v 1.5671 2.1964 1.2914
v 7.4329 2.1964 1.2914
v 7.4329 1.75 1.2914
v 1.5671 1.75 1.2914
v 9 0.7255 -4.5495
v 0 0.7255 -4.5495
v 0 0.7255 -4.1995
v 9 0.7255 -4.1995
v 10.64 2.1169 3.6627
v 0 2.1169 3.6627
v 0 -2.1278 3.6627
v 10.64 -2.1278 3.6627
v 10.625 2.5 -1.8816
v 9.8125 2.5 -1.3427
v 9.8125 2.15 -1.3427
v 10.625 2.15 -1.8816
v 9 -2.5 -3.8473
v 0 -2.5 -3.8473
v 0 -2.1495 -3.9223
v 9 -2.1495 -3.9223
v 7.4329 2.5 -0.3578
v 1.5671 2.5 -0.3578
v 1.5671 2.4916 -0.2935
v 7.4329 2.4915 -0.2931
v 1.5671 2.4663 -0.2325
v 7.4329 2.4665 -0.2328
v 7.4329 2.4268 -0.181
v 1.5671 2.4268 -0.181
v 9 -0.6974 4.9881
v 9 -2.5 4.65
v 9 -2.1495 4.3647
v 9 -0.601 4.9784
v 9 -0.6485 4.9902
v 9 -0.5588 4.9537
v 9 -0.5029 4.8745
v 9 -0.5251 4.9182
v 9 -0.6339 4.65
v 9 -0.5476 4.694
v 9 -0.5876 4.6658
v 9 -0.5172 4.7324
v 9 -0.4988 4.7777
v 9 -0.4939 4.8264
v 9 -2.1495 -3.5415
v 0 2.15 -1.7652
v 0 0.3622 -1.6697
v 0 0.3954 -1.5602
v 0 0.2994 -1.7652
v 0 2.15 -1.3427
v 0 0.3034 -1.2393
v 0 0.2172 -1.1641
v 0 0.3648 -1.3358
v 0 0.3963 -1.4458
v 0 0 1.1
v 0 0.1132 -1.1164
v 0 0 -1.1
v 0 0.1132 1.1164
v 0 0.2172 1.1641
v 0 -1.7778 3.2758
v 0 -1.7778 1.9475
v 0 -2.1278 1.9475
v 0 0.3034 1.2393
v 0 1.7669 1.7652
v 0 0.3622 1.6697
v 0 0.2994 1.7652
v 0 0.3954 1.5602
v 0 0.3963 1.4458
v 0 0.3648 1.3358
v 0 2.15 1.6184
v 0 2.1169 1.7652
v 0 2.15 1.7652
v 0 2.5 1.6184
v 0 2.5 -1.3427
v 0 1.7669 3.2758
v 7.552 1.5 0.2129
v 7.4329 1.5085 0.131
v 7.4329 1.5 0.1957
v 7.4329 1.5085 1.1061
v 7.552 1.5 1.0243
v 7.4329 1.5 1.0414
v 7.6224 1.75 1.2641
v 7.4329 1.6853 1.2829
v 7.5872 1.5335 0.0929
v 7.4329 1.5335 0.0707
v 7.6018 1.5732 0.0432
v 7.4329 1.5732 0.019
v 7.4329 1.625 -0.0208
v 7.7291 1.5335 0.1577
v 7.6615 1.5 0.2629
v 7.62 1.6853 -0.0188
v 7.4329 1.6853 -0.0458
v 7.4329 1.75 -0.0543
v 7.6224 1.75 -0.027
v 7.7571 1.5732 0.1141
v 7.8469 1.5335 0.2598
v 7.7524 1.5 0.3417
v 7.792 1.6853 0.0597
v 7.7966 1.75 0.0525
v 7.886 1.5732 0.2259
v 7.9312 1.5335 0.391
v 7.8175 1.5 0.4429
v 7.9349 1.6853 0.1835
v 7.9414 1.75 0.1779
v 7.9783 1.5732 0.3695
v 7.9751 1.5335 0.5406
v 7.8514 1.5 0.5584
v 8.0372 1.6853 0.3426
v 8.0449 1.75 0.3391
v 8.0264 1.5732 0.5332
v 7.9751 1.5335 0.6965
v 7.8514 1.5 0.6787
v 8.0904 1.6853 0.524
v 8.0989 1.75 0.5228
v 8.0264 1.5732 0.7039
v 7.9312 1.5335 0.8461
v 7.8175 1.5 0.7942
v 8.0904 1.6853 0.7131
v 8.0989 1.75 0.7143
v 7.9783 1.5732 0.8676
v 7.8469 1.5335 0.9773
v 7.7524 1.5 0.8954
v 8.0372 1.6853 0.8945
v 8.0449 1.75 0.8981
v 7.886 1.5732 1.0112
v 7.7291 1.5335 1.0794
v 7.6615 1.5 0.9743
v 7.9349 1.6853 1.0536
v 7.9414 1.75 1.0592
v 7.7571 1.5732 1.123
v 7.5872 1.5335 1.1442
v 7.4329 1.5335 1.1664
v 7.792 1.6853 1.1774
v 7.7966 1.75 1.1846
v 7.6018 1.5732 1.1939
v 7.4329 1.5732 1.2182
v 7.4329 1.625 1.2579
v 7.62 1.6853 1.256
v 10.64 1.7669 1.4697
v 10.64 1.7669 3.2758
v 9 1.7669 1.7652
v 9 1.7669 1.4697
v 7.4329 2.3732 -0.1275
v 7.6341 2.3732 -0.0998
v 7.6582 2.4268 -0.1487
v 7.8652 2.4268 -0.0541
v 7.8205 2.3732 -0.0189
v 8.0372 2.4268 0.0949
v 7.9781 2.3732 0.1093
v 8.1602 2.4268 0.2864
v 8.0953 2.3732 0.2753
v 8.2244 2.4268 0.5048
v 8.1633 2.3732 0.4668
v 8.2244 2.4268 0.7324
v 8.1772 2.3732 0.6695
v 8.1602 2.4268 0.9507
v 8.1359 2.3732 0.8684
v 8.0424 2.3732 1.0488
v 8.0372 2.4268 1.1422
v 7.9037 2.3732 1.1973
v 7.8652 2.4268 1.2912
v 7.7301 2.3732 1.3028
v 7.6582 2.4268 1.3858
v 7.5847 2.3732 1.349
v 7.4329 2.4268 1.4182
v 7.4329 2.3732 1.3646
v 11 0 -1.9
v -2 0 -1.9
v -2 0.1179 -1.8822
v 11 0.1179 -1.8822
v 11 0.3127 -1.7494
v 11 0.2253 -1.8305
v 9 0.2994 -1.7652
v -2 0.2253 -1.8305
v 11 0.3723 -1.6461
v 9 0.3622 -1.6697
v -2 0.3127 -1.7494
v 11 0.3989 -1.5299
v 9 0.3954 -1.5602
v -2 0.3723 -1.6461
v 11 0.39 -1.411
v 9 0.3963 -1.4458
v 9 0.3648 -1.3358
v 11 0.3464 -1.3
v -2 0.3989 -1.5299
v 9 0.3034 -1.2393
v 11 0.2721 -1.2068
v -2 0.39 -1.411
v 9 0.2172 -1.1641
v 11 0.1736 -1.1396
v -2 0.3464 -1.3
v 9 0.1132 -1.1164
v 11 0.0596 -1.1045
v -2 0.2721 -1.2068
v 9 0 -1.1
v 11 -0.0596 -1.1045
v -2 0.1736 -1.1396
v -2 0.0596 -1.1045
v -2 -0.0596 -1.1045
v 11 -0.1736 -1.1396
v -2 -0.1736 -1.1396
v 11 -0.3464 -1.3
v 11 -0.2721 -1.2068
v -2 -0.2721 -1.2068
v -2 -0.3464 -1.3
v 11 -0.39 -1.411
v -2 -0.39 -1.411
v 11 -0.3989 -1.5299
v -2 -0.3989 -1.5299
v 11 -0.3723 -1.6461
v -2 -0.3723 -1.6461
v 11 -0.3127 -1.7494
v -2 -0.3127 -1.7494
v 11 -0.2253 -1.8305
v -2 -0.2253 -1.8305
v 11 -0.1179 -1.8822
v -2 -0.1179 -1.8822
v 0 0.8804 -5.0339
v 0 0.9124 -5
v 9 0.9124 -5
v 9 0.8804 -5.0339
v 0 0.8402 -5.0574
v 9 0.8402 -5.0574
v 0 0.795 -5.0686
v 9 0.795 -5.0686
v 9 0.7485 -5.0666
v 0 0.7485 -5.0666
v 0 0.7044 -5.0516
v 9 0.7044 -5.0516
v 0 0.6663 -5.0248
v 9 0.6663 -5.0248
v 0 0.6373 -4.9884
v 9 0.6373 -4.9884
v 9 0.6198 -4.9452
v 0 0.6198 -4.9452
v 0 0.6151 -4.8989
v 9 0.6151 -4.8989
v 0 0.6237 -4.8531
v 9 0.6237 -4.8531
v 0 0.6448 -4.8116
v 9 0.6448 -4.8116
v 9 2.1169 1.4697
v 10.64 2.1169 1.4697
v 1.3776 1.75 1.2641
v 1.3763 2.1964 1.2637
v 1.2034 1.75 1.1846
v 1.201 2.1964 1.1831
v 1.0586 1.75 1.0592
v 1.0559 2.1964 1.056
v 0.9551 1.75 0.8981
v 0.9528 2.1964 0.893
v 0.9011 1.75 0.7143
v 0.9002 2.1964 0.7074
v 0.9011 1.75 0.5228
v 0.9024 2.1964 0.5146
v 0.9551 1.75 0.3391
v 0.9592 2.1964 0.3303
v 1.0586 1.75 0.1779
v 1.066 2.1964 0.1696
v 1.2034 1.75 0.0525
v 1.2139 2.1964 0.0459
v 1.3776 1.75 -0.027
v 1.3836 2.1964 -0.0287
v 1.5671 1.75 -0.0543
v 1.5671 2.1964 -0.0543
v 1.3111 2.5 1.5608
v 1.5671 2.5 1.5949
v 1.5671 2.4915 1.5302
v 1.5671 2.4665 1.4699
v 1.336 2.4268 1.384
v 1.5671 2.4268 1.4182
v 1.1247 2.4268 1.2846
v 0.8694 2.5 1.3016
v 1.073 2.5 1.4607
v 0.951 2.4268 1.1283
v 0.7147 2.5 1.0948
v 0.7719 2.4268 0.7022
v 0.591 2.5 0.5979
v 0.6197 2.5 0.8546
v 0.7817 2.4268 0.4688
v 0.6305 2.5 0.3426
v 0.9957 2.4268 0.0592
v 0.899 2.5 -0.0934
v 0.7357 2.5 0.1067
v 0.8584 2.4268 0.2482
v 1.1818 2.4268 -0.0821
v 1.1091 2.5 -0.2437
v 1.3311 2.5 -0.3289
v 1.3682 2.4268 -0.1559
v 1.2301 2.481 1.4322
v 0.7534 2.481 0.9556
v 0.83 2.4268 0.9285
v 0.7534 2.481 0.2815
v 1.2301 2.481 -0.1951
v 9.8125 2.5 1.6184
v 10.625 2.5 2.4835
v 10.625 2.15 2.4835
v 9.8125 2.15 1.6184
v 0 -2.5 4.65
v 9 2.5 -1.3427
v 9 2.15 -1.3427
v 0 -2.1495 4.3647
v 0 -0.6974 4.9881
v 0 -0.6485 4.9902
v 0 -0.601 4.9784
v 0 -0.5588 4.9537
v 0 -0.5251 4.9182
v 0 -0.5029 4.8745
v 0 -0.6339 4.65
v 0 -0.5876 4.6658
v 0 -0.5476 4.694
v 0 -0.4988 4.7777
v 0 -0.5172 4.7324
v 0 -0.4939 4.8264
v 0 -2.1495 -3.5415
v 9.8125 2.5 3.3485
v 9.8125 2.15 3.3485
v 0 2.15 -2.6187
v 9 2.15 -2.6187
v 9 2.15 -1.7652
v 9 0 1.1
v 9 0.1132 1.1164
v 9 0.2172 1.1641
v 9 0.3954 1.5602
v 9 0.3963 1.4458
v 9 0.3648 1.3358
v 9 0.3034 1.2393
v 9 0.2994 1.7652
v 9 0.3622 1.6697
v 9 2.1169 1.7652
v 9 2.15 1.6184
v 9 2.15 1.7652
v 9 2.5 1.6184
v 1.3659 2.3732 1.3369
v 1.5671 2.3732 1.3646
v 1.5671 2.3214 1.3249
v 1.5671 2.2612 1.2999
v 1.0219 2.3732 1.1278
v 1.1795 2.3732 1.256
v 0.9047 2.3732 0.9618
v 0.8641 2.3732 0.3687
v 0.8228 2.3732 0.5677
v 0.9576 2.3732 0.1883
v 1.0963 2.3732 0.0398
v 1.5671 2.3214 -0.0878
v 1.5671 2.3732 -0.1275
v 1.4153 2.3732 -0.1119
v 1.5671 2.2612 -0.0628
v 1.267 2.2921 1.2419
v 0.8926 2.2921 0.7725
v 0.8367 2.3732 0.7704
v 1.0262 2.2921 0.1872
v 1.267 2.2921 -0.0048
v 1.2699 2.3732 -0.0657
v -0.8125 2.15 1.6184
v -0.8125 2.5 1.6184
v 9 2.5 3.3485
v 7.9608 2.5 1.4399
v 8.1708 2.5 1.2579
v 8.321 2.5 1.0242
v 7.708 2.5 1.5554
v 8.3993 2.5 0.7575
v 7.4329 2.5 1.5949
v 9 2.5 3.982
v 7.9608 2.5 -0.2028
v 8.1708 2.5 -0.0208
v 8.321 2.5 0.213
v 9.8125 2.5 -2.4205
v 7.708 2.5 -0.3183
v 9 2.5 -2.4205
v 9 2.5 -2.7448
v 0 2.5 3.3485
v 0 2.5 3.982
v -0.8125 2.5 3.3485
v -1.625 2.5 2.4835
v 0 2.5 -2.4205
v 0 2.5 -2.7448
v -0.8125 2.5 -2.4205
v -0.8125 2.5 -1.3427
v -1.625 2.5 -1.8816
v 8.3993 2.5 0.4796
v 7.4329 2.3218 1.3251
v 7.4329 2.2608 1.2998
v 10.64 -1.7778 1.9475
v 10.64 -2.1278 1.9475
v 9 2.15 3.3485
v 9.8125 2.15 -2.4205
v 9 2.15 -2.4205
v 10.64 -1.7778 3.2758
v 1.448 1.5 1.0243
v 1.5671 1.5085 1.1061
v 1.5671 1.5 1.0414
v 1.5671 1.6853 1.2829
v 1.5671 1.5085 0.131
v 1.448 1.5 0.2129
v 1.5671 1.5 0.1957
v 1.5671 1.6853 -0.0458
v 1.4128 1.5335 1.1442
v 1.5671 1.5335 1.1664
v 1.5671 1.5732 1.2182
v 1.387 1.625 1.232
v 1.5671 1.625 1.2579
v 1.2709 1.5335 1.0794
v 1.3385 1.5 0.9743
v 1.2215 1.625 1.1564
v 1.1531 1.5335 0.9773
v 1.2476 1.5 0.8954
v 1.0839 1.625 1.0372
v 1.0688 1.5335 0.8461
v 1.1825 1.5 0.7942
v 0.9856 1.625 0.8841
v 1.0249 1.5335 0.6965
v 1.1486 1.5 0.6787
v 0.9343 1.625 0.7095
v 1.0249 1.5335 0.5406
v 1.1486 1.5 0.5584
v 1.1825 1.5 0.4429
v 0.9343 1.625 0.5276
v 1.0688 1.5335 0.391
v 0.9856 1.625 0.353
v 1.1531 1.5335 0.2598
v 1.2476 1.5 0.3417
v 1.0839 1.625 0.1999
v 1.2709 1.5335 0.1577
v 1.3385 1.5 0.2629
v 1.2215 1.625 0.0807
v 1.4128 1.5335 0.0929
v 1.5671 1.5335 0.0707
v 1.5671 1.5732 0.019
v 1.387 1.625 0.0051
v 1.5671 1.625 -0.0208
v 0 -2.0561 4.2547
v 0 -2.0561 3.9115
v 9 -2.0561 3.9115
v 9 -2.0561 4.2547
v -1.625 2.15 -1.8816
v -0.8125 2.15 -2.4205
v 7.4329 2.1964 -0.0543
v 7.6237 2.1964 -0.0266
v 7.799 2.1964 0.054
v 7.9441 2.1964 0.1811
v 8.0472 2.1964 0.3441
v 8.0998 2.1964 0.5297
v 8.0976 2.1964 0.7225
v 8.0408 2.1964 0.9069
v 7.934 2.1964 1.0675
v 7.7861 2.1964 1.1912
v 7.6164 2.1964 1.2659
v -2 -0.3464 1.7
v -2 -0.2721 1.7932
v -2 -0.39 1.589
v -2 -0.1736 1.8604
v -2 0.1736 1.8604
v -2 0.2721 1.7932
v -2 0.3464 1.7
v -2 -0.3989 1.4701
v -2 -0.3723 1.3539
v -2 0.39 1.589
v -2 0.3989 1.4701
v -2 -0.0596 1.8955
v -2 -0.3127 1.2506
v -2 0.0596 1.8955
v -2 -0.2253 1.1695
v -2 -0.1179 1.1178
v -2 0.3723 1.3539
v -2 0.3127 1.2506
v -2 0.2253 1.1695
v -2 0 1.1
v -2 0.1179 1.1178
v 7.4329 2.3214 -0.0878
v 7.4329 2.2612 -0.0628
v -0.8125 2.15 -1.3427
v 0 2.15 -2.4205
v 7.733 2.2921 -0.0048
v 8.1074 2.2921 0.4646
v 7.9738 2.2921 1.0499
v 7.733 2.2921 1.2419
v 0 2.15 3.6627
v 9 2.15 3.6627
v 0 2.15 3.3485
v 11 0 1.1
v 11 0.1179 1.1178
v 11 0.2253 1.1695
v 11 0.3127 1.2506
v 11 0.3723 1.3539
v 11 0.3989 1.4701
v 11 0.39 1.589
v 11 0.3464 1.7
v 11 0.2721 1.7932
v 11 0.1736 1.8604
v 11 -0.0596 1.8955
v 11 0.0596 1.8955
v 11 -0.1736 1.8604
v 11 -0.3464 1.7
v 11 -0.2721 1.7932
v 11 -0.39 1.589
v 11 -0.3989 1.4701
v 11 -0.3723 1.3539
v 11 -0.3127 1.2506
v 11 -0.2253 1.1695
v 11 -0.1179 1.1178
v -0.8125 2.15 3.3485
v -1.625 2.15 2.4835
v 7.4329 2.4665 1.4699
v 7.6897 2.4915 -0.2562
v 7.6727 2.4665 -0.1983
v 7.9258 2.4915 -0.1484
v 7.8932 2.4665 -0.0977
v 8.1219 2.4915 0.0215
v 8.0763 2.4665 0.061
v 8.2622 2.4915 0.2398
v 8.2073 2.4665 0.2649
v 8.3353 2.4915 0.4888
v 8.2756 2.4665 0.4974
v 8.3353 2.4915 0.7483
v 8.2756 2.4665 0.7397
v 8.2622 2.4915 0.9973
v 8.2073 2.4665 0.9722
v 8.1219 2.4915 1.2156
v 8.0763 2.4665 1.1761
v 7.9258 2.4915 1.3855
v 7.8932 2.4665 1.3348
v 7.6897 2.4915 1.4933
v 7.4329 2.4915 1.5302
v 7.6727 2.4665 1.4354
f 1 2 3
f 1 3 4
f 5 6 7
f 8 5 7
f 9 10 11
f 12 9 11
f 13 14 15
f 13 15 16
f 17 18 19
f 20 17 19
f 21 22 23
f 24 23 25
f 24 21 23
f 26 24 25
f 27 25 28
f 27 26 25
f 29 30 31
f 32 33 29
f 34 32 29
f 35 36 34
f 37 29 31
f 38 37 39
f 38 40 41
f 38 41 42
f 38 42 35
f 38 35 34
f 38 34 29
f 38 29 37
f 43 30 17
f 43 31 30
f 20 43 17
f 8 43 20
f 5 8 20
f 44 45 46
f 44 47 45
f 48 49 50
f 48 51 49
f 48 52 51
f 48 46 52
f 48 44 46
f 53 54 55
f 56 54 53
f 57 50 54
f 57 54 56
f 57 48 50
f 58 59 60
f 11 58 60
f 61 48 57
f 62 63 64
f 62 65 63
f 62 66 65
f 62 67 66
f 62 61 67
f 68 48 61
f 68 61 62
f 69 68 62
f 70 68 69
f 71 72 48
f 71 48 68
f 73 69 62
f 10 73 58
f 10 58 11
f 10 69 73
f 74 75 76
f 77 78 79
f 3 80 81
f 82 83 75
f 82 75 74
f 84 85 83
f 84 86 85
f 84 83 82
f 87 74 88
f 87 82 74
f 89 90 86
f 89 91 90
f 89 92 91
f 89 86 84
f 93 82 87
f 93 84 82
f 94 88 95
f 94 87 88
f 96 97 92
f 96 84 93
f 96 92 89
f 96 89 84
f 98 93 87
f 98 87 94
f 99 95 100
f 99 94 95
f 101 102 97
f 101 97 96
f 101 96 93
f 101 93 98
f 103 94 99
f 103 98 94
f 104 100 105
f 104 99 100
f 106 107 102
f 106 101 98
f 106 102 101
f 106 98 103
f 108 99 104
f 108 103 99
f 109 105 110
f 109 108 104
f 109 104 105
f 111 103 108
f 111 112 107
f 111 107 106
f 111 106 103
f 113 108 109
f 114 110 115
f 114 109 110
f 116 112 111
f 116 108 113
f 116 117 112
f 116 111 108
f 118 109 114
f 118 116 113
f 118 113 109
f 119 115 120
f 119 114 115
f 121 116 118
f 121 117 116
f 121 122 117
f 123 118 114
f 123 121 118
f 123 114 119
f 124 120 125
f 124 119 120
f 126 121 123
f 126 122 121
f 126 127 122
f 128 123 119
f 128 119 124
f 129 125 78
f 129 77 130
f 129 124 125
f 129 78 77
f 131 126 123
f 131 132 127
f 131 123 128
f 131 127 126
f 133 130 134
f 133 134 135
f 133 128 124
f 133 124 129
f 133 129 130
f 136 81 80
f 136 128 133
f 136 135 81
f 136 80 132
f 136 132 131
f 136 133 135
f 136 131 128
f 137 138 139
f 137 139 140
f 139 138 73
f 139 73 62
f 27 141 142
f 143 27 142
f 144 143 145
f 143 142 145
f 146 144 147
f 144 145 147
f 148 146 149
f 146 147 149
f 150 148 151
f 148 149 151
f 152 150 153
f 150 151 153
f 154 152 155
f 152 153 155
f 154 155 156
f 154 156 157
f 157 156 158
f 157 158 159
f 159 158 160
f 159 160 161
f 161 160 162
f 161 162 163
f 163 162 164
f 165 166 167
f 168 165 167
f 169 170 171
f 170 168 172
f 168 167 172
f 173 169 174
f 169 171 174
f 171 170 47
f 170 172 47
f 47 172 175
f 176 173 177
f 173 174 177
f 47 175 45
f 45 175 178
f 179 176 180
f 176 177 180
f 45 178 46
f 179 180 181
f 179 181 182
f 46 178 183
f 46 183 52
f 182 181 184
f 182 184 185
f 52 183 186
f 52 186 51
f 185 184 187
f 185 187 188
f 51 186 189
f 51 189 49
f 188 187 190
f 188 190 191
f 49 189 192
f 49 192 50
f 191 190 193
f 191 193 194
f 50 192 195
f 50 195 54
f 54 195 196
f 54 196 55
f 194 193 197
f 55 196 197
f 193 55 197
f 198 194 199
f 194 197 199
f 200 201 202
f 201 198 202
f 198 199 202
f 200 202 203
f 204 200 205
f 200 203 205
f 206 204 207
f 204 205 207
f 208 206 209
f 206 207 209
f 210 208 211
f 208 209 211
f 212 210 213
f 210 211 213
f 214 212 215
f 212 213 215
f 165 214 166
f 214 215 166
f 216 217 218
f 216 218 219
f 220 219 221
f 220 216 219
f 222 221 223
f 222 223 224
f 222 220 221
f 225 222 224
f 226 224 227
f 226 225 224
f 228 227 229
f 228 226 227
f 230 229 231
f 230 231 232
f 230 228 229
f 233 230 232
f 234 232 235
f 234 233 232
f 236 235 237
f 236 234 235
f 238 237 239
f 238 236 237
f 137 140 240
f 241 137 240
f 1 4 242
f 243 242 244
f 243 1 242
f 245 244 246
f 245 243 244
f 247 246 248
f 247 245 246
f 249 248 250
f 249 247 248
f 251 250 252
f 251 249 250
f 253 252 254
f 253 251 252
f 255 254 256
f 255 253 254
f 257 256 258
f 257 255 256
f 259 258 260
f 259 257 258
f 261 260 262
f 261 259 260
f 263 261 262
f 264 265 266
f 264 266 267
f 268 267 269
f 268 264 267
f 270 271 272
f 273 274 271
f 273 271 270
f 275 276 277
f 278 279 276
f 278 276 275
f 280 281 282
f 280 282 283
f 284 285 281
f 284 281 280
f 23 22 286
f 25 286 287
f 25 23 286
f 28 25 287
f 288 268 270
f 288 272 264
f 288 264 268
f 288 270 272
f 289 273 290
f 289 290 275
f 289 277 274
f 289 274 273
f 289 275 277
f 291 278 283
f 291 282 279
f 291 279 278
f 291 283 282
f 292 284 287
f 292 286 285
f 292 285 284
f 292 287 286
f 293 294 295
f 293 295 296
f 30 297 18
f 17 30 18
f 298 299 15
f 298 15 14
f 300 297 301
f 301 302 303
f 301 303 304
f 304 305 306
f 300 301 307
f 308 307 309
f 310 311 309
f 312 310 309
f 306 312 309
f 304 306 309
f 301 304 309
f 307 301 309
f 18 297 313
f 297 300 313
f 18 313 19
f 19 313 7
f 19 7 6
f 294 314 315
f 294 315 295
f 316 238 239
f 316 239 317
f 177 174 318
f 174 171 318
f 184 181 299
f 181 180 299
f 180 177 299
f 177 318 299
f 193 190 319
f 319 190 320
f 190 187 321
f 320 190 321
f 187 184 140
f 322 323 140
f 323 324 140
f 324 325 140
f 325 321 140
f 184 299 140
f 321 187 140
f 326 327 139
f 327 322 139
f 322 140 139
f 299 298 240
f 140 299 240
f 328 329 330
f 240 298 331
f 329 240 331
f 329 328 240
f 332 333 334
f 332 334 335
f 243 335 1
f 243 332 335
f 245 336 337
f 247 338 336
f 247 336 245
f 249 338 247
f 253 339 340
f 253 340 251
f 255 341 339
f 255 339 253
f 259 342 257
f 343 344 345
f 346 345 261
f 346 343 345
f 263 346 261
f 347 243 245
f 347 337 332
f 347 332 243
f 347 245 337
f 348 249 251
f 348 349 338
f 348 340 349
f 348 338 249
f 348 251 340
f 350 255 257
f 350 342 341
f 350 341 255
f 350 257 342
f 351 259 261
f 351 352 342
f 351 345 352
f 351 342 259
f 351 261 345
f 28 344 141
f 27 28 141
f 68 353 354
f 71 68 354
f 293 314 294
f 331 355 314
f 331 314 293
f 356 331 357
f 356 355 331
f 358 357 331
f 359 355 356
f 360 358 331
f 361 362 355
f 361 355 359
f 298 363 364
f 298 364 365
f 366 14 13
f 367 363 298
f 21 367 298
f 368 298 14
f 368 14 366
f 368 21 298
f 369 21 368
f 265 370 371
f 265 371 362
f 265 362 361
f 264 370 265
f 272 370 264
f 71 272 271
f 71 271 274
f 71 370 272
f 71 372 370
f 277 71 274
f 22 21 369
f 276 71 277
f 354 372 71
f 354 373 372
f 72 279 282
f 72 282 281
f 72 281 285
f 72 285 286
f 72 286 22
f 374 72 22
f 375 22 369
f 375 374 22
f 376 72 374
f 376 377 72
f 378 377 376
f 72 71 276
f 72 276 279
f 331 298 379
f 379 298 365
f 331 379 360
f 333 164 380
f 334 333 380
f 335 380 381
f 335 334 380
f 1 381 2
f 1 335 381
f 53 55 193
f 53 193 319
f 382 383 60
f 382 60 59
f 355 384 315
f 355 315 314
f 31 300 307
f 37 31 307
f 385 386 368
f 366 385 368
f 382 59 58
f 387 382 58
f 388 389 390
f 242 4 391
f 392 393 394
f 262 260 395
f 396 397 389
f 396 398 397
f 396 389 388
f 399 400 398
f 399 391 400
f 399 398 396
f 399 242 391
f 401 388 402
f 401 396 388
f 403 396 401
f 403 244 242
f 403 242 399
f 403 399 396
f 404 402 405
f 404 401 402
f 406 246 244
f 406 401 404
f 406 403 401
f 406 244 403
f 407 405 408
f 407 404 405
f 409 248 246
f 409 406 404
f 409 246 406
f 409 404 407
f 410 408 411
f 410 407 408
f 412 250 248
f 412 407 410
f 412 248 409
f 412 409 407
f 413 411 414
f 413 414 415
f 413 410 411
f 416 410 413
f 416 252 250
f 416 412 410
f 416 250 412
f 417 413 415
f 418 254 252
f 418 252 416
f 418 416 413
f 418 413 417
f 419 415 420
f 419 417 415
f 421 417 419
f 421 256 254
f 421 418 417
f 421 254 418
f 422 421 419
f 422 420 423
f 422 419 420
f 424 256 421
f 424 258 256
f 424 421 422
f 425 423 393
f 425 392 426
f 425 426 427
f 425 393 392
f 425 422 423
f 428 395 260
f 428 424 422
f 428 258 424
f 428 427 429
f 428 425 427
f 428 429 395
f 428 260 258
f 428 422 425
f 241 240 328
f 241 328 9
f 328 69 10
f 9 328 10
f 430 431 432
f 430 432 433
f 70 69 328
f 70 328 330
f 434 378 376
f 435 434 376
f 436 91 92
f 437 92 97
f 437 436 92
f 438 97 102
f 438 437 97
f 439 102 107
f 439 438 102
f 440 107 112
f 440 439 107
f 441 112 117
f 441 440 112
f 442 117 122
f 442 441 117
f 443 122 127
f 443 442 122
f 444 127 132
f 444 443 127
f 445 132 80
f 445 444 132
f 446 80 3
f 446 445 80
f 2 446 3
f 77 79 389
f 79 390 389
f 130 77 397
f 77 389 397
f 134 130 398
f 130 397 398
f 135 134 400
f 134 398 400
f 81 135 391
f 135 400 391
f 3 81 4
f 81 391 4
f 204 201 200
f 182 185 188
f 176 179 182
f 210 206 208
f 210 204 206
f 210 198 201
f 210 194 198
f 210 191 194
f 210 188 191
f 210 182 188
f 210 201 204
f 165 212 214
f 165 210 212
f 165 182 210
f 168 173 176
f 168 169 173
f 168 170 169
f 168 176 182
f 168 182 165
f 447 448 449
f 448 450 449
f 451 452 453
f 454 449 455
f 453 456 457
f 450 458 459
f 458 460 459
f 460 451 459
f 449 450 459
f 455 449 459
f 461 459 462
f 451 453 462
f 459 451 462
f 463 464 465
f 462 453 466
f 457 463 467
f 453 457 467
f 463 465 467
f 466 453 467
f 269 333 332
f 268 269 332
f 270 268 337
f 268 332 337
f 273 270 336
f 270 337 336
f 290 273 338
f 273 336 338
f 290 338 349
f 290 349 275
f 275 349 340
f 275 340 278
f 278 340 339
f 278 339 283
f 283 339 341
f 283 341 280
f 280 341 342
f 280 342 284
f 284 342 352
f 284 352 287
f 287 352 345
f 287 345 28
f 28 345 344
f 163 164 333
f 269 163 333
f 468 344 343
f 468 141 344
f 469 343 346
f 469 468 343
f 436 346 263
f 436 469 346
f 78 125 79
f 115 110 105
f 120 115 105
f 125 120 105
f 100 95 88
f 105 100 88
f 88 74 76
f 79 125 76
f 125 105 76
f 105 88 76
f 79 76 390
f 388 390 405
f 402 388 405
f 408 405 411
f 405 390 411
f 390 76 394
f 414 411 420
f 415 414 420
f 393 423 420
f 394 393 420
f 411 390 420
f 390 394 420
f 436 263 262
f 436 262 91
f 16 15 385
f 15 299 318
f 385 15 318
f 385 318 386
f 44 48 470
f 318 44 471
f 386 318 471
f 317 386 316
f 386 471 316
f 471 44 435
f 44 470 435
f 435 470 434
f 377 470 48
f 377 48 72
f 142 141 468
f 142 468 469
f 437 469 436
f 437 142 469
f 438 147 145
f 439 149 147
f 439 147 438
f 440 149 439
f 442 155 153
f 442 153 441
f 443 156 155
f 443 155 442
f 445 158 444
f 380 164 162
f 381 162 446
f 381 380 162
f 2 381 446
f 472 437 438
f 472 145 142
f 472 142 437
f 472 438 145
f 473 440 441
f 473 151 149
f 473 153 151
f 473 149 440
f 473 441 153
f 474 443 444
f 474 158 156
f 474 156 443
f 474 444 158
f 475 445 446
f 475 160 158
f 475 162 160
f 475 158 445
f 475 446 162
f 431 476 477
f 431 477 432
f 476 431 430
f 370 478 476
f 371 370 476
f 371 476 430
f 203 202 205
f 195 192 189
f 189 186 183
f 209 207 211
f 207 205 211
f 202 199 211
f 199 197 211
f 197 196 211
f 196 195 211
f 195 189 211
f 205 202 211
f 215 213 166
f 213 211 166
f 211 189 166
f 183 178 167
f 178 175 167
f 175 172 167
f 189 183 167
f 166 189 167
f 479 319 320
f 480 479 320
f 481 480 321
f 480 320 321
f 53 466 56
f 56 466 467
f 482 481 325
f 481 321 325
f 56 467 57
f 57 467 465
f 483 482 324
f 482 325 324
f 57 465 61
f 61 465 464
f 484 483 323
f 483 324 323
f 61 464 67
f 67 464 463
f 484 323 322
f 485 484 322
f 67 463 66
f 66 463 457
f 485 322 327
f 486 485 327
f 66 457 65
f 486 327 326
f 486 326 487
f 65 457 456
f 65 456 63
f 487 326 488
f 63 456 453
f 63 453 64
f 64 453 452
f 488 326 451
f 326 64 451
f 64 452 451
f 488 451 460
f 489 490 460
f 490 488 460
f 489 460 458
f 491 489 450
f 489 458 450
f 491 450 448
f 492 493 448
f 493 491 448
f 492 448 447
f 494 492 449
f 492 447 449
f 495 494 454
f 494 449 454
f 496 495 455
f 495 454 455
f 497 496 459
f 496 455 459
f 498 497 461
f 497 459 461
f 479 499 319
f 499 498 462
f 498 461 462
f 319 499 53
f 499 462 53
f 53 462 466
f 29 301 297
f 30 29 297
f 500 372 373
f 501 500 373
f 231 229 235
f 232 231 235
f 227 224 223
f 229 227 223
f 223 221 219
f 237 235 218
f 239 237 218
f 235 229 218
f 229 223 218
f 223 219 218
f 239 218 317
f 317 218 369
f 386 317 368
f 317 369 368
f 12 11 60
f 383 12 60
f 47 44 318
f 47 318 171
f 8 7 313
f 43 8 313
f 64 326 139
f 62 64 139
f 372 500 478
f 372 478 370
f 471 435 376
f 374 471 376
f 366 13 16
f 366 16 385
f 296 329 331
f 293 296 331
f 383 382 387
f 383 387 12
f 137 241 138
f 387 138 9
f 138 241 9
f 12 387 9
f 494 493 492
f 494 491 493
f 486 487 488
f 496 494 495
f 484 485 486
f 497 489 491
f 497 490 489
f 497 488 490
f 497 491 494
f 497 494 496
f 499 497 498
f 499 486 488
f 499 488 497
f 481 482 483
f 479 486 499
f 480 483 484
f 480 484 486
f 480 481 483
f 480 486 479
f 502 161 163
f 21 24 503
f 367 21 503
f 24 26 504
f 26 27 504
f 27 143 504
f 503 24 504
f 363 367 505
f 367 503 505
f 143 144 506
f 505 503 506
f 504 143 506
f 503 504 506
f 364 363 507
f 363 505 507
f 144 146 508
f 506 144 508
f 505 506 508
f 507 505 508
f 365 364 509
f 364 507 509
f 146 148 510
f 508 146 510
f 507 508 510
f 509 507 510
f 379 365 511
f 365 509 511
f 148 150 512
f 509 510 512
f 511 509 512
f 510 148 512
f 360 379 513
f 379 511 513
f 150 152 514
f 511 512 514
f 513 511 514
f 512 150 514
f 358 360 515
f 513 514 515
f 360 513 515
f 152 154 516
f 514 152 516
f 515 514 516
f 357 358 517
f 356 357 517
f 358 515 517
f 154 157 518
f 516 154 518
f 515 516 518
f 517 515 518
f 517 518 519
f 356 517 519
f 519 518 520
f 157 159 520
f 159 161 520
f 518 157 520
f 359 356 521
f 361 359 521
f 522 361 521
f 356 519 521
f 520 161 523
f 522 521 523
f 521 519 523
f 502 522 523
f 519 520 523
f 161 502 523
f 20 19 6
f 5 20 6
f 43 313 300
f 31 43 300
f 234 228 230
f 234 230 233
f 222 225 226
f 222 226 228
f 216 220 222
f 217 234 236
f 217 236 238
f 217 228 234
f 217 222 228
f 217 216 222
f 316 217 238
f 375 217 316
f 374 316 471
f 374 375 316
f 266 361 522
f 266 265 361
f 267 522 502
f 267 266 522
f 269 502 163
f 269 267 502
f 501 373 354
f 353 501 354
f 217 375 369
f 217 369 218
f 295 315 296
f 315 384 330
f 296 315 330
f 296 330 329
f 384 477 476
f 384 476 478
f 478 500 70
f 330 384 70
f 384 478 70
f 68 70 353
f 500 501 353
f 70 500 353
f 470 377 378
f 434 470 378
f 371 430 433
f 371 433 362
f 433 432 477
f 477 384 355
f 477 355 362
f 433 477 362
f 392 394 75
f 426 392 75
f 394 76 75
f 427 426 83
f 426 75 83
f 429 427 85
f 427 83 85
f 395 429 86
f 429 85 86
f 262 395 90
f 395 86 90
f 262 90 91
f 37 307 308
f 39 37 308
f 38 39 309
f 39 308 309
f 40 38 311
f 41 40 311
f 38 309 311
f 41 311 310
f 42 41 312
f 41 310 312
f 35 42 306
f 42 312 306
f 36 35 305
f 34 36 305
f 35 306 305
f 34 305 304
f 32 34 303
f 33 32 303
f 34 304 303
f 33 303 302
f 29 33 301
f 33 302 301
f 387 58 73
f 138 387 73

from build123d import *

# Parameters (mm, degrees)
RESSALTO_EXTRUS_O1_DEPTH      = 9
RESSALTO_EXTRUS_O1_2_DEPTH    = 9
CORTE_EXTRUS_O1_DEPTH         = 1
CHANFRO1_SIZE                 = 0.2
FILETE1_R                     = 0.25
FILETE2_R                     = 0.25
FILETE3_R                     = 0.25
RESSALTO_EXTRUS_O2_DEPTH      = 3
RESSALTO_EXTRUS_O2_DEPTH_BACK = 12
ESBO_O3_R                     = 0.4
ESBO_O4_W                     = 1.462776185
ESBO_O4_H                     = 17.561147647
CORTE_EXTRUS_O3_DEPTH         = 12
RESSALTO_EXTRUS_O3_DEPTH      = 4
RESSALTO_EXTRUS_O3_DEPTH_BACK = 12
ESBO_O5_W                     = 1.730119391
ESBO_O5_H                     = 0.35
ESBO_O5_W_2                   = 1.077736426
CORTE_EXTRUS_O6_DEPTH         = 0.36
CORTE_EXTRUS_O8_DEPTH         = 2.36
CORTE_EXTRUS_O9_DEPTH         = 3
CORTE_EXTRUS_O10_DEPTH        = 0.36
CORTE_EXTRUS_O11_DEPTH        = 0.36


with BuildPart() as part:
    # Esboço1 → Ressalto-extrusão1 (new body)
    with BuildSketch(Plane(origin=(0, 0, 0), x_dir=(0, 0, -1), z_dir=(1, 0, 0))):
        with BuildLine():
            ThreePointArc((5, 0.912371134), (5.039602728, 0.68438786), (4.811619455, 0.644785132))
            Line((4.811619455, 0.644785132), (2.61869959, 2.15))
            Line((2.61869959, 2.15), (1.765244755, 2.15))
            Line((1.765244755, 2.15), (1.765244755, 0))
            Line((1.765244755, 0), (-1.765244755, 0))
            Line((-1.765244755, 0), (-1.765244755, 2.15))
            Line((-1.765244755, 2.15), (-3.6626751, 2.15))
            Line((-3.6626751, 2.15), (-3.911509847, -2.056109913))
            Line((-3.911509847, -2.056109913), (-4.254719223, -2.056109913))
            Line((-4.254719223, -2.056109913), (-3.981958763, 2.5))
            Line((-3.981958763, 2.5), (2.744845361, 2.5))
            Line((2.744845361, 2.5), (5, 0.912371134))
        make_face()
    extrude(amount=RESSALTO_EXTRUS_O1_DEPTH)

    # Esboço2 → Corte-extrusão1 (cut)
    with BuildSketch(Plane(origin=(0, 2.5, 0), x_dir=(1, 0, 0), z_dir=(0, 1, 0))):
        with BuildLine():
            Line((1.567113196, 0.054268876), (7.432886804, 0.054268876))
            ThreePointArc((7.432886804, 0.054268876), (8.10571238, -0.618556701), (7.432886804, -1.291382278))
            Line((7.432886804, -1.291382278), (1.567113196, -1.291382278))
            ThreePointArc((1.567113196, -1.291382278), (0.89428762, -0.618556701), (1.567113196, 0.054268876))
        make_face()
    extrude(amount=-CORTE_EXTRUS_O1_DEPTH, mode=Mode.SUBTRACT)

    # Chanfro1
    chanfro1_edges = [part.edges().sort_by_distance(p)[0] for p in [
        (0.89428762, 2.5, 0.618556701),
        (4.5, 2.5, 1.291382278),
        (8.10571238, 2.5, 0.618556701),
        (4.5, 2.5, -0.054268876),
    ]]
    chamfer(chanfro1_edges, length=CHANFRO1_SIZE)

    # Filete1
    filete1_edges = [part.edges().sort_by_distance(p)[0] for p in [
        (4.5, 2.5, 1.491382278),
        (8.30571238, 2.5, 0.618556701),
        (0.69428762, 2.5, 0.618556701),
        (4.5, 2.5, -0.254268876),
    ]]
    fillet(filete1_edges, radius=FILETE1_R)

    # Filete2
    filete2_edges = [part.edges().sort_by_distance(p)[0] for p in [
        (4.5, 2.3, -0.054268876),
        (0.89428762, 2.3, 0.618556701),
        (8.10571238, 2.3, 0.618556701),
        (4.5, 2.3, 1.291382278),
    ]]
    fillet(filete2_edges, radius=FILETE2_R)

    # Filete3
    filete3_edges = [part.edges().sort_by_distance(p)[0] for p in [
        (0.89428762, 1.5, 0.618556701),
        (4.5, 1.5, -0.054268876),
        (8.10571238, 1.5, 0.618556701),
        (4.5, 1.5, 1.291382278),
    ]]
    fillet(filete3_edges, radius=FILETE3_R)

    # Esboço3 → Ressalto-extrusão2 (add, two sides: drawn at the far end of the back side and taken through both)
    with BuildSketch(Plane(origin=(9, 0, 0), x_dir=(0, 0, -1), z_dir=(1, 0, 0)).offset(-RESSALTO_EXTRUS_O2_DEPTH_BACK)):
        with Locations((1.5, 0)):
            Circle(ESBO_O3_R)
        with Locations((-1.5, 0)):
            Circle(ESBO_O3_R)
    extrude(amount=RESSALTO_EXTRUS_O2_DEPTH + RESSALTO_EXTRUS_O2_DEPTH_BACK)

    # Esboço4 → Corte-extrusão3 (cut)
    with BuildSketch(Plane(origin=(0, 2.963575633, -2.086357246), x_dir=(1, 0, 0), z_dir=(0, 0.8176923764210481, -0.5756554330004183))):
        with Locations((11.731388093, -2.530326619)):
            Rectangle(ESBO_O4_W, ESBO_O4_H)
        with Locations((-2.731388093, -2.530326619)):
            Rectangle(ESBO_O4_W, ESBO_O4_H)
    extrude(amount=-CORTE_EXTRUS_O3_DEPTH, mode=Mode.SUBTRACT)

    # Esboço5 → Ressalto-extrusão3 (add, two sides: drawn at the far end of the back side and taken through both)
    with BuildSketch(Plane(origin=(9, 0, 0), x_dir=(0, 0, -1), z_dir=(1, 0, 0)).offset(-RESSALTO_EXTRUS_O3_DEPTH_BACK)):
        Polygon((-3.6626751, 2.116911528), (-3.6626751, -2.127847944), (-1.947482914, -2.127847944), (-1.947482914, -1.777847944), (-3.275815381, -1.777847944), (-3.275815381, 1.766911528), (-1.469749308, 1.766911528), (-1.469749308, 2.116911528), align=None)
        with Locations((-2.483476717, 2.325)):
            Rectangle(ESBO_O5_W, ESBO_O5_H)
        with Locations((1.881616355, 2.325)):
            Rectangle(ESBO_O5_W_2, ESBO_O5_H)
    extrude(amount=RESSALTO_EXTRUS_O3_DEPTH + RESSALTO_EXTRUS_O3_DEPTH_BACK)

    # Esboço7 → Corte-extrusão6 (cut)
    with BuildSketch(Plane(origin=(0, 2.5, 0), x_dir=(1, 0, 0), z_dir=(0, 1, 0))):
        Polygon((10.625, -8.423324635), (15.073277982, -8.423324635), (15.073277982, 13.913015356), (10.913616259, 13.913015356), (10.625, 11.310202992), (10.625, -5.82051227), align=None)
        Polygon((-1.625, -5.82051227), (-1.625, 11.310202992), (-1.300663163, 13.913015356), (-6.073277982, 13.913015356), (-6.073277982, -8.423324635), (-1.625, -8.423324635), align=None)
    extrude(amount=-CORTE_EXTRUS_O6_DEPTH, mode=Mode.SUBTRACT)

    # Esboço11 → Corte-extrusão8 (cut)
    with BuildSketch(Plane(origin=(13, 0, 0), x_dir=(0, 0, -1), z_dir=(1, 0, 0))):
        Polygon((-3.6626751, 2.116911528), (-1.469749308, 2.116911528), (-1.469749308, 1.766911528), (-3.275815381, 1.766911528), (-3.275815381, -1.777847944), (-1.947482914, -1.777847944), (-1.947482914, -2.127847944), (-3.6626751, -2.127847944), align=None)
    extrude(amount=-CORTE_EXTRUS_O8_DEPTH, mode=Mode.SUBTRACT)

    # Esboço12 → Corte-extrusão9 (cut)
    with BuildSketch(Plane.ZY.offset(3)):
        Polygon((1.469749308, 2.116911528), (1.469749308, 1.766911528), (3.275815381, 1.766911528), (3.275815381, -1.777847944), (1.947482914, -1.777847944), (1.947482914, -2.127847944), (3.6626751, -2.127847944), (3.6626751, 2.116911528), align=None)
    extrude(amount=-CORTE_EXTRUS_O9_DEPTH, mode=Mode.SUBTRACT)

    # Esboço13 → Corte-extrusão10 (cut)
    with BuildSketch(Plane(origin=(0, 2.5, 0), x_dir=(1, 0, 0), z_dir=(0, 1, 0))):
        Polygon((-1.625, 1.881616355), (-0.8125, 2.420484568), (-0.619357686, 3.416910301), (-2.700274801, 2.918697434), (-3.188623859, 0.39929318), (-0.8125, 0.220139081), (-0.8125, 1.342748142), align=None)
        Polygon((-1.625, -2.483476717), (-0.8125, -1.618417021), (-1.509025148, -0.428262629), (-2.971698772, -0.835398587), (-2.805828567, -2.916006565), (-2.566502248, -4.18187146), (-1.625, -4.378989326), (-0.8125, -3.348536412), align=None)
    extrude(amount=-CORTE_EXTRUS_O10_DEPTH, mode=Mode.SUBTRACT)

    # Esboço14 → Corte-extrusão11 (cut)
    with BuildSketch(Plane(origin=(0, 2.5, 0), x_dir=(1, 0, 0), z_dir=(0, 1, 0))):
        Polygon((10.625, 1.881616355), (9.8125, 2.420484568), (9.8125, 3.383797521), (12.178736947, 2.576774689), (12.29047857, 0.913066082), (10.142556264, 0.180537666), (9.8125, 1.342748142), align=None)
        Polygon((10.625, -2.483476717), (9.8125, -1.618417021), (9.8125, -0.837552676), (12.886433892, -1.39626079), (11.818680607, -3.348536412), (10.527444076, -4.028396796), (9.8125, -3.348536412), align=None)
    extrude(amount=-CORTE_EXTRUS_O11_DEPTH, mode=Mode.SUBTRACT)


with BuildPart() as body_2:
    # Esboço1 → Ressalto-extrus_o1 2 (new body)
    with BuildSketch(Plane(origin=(0, 0, 0), x_dir=(0, 0, -1), z_dir=(1, 0, 0))):
        with BuildLine():
            Line((-4.65, -2.5), (3.847277584, -2.5))
            Line((3.847277584, -2.5), (3.922324932, -2.149484536))
            Line((3.922324932, -2.149484536), (4.549458244, 0.725462093))
            Line((4.549458244, 0.725462093), (4.199458244, 0.725462093))
            Line((4.199458244, 0.725462093), (3.541450501, -2.149484536))
            Line((3.541450501, -2.149484536), (-4.364736204, -2.149484536))
            Line((-4.364736204, -2.149484536), (-4.650020475, -0.633911844))
            ThreePointArc((-4.650020475, -0.633911844), (-4.850815775, -0.496687472), (-4.988104747, -0.697438608))
            Line((-4.988104747, -0.697438608), (-4.65, -2.5))
        make_face()
    extrude(amount=RESSALTO_EXTRUS_O1_2_DEPTH)


solid = Compound([part.part, body_2.part])
